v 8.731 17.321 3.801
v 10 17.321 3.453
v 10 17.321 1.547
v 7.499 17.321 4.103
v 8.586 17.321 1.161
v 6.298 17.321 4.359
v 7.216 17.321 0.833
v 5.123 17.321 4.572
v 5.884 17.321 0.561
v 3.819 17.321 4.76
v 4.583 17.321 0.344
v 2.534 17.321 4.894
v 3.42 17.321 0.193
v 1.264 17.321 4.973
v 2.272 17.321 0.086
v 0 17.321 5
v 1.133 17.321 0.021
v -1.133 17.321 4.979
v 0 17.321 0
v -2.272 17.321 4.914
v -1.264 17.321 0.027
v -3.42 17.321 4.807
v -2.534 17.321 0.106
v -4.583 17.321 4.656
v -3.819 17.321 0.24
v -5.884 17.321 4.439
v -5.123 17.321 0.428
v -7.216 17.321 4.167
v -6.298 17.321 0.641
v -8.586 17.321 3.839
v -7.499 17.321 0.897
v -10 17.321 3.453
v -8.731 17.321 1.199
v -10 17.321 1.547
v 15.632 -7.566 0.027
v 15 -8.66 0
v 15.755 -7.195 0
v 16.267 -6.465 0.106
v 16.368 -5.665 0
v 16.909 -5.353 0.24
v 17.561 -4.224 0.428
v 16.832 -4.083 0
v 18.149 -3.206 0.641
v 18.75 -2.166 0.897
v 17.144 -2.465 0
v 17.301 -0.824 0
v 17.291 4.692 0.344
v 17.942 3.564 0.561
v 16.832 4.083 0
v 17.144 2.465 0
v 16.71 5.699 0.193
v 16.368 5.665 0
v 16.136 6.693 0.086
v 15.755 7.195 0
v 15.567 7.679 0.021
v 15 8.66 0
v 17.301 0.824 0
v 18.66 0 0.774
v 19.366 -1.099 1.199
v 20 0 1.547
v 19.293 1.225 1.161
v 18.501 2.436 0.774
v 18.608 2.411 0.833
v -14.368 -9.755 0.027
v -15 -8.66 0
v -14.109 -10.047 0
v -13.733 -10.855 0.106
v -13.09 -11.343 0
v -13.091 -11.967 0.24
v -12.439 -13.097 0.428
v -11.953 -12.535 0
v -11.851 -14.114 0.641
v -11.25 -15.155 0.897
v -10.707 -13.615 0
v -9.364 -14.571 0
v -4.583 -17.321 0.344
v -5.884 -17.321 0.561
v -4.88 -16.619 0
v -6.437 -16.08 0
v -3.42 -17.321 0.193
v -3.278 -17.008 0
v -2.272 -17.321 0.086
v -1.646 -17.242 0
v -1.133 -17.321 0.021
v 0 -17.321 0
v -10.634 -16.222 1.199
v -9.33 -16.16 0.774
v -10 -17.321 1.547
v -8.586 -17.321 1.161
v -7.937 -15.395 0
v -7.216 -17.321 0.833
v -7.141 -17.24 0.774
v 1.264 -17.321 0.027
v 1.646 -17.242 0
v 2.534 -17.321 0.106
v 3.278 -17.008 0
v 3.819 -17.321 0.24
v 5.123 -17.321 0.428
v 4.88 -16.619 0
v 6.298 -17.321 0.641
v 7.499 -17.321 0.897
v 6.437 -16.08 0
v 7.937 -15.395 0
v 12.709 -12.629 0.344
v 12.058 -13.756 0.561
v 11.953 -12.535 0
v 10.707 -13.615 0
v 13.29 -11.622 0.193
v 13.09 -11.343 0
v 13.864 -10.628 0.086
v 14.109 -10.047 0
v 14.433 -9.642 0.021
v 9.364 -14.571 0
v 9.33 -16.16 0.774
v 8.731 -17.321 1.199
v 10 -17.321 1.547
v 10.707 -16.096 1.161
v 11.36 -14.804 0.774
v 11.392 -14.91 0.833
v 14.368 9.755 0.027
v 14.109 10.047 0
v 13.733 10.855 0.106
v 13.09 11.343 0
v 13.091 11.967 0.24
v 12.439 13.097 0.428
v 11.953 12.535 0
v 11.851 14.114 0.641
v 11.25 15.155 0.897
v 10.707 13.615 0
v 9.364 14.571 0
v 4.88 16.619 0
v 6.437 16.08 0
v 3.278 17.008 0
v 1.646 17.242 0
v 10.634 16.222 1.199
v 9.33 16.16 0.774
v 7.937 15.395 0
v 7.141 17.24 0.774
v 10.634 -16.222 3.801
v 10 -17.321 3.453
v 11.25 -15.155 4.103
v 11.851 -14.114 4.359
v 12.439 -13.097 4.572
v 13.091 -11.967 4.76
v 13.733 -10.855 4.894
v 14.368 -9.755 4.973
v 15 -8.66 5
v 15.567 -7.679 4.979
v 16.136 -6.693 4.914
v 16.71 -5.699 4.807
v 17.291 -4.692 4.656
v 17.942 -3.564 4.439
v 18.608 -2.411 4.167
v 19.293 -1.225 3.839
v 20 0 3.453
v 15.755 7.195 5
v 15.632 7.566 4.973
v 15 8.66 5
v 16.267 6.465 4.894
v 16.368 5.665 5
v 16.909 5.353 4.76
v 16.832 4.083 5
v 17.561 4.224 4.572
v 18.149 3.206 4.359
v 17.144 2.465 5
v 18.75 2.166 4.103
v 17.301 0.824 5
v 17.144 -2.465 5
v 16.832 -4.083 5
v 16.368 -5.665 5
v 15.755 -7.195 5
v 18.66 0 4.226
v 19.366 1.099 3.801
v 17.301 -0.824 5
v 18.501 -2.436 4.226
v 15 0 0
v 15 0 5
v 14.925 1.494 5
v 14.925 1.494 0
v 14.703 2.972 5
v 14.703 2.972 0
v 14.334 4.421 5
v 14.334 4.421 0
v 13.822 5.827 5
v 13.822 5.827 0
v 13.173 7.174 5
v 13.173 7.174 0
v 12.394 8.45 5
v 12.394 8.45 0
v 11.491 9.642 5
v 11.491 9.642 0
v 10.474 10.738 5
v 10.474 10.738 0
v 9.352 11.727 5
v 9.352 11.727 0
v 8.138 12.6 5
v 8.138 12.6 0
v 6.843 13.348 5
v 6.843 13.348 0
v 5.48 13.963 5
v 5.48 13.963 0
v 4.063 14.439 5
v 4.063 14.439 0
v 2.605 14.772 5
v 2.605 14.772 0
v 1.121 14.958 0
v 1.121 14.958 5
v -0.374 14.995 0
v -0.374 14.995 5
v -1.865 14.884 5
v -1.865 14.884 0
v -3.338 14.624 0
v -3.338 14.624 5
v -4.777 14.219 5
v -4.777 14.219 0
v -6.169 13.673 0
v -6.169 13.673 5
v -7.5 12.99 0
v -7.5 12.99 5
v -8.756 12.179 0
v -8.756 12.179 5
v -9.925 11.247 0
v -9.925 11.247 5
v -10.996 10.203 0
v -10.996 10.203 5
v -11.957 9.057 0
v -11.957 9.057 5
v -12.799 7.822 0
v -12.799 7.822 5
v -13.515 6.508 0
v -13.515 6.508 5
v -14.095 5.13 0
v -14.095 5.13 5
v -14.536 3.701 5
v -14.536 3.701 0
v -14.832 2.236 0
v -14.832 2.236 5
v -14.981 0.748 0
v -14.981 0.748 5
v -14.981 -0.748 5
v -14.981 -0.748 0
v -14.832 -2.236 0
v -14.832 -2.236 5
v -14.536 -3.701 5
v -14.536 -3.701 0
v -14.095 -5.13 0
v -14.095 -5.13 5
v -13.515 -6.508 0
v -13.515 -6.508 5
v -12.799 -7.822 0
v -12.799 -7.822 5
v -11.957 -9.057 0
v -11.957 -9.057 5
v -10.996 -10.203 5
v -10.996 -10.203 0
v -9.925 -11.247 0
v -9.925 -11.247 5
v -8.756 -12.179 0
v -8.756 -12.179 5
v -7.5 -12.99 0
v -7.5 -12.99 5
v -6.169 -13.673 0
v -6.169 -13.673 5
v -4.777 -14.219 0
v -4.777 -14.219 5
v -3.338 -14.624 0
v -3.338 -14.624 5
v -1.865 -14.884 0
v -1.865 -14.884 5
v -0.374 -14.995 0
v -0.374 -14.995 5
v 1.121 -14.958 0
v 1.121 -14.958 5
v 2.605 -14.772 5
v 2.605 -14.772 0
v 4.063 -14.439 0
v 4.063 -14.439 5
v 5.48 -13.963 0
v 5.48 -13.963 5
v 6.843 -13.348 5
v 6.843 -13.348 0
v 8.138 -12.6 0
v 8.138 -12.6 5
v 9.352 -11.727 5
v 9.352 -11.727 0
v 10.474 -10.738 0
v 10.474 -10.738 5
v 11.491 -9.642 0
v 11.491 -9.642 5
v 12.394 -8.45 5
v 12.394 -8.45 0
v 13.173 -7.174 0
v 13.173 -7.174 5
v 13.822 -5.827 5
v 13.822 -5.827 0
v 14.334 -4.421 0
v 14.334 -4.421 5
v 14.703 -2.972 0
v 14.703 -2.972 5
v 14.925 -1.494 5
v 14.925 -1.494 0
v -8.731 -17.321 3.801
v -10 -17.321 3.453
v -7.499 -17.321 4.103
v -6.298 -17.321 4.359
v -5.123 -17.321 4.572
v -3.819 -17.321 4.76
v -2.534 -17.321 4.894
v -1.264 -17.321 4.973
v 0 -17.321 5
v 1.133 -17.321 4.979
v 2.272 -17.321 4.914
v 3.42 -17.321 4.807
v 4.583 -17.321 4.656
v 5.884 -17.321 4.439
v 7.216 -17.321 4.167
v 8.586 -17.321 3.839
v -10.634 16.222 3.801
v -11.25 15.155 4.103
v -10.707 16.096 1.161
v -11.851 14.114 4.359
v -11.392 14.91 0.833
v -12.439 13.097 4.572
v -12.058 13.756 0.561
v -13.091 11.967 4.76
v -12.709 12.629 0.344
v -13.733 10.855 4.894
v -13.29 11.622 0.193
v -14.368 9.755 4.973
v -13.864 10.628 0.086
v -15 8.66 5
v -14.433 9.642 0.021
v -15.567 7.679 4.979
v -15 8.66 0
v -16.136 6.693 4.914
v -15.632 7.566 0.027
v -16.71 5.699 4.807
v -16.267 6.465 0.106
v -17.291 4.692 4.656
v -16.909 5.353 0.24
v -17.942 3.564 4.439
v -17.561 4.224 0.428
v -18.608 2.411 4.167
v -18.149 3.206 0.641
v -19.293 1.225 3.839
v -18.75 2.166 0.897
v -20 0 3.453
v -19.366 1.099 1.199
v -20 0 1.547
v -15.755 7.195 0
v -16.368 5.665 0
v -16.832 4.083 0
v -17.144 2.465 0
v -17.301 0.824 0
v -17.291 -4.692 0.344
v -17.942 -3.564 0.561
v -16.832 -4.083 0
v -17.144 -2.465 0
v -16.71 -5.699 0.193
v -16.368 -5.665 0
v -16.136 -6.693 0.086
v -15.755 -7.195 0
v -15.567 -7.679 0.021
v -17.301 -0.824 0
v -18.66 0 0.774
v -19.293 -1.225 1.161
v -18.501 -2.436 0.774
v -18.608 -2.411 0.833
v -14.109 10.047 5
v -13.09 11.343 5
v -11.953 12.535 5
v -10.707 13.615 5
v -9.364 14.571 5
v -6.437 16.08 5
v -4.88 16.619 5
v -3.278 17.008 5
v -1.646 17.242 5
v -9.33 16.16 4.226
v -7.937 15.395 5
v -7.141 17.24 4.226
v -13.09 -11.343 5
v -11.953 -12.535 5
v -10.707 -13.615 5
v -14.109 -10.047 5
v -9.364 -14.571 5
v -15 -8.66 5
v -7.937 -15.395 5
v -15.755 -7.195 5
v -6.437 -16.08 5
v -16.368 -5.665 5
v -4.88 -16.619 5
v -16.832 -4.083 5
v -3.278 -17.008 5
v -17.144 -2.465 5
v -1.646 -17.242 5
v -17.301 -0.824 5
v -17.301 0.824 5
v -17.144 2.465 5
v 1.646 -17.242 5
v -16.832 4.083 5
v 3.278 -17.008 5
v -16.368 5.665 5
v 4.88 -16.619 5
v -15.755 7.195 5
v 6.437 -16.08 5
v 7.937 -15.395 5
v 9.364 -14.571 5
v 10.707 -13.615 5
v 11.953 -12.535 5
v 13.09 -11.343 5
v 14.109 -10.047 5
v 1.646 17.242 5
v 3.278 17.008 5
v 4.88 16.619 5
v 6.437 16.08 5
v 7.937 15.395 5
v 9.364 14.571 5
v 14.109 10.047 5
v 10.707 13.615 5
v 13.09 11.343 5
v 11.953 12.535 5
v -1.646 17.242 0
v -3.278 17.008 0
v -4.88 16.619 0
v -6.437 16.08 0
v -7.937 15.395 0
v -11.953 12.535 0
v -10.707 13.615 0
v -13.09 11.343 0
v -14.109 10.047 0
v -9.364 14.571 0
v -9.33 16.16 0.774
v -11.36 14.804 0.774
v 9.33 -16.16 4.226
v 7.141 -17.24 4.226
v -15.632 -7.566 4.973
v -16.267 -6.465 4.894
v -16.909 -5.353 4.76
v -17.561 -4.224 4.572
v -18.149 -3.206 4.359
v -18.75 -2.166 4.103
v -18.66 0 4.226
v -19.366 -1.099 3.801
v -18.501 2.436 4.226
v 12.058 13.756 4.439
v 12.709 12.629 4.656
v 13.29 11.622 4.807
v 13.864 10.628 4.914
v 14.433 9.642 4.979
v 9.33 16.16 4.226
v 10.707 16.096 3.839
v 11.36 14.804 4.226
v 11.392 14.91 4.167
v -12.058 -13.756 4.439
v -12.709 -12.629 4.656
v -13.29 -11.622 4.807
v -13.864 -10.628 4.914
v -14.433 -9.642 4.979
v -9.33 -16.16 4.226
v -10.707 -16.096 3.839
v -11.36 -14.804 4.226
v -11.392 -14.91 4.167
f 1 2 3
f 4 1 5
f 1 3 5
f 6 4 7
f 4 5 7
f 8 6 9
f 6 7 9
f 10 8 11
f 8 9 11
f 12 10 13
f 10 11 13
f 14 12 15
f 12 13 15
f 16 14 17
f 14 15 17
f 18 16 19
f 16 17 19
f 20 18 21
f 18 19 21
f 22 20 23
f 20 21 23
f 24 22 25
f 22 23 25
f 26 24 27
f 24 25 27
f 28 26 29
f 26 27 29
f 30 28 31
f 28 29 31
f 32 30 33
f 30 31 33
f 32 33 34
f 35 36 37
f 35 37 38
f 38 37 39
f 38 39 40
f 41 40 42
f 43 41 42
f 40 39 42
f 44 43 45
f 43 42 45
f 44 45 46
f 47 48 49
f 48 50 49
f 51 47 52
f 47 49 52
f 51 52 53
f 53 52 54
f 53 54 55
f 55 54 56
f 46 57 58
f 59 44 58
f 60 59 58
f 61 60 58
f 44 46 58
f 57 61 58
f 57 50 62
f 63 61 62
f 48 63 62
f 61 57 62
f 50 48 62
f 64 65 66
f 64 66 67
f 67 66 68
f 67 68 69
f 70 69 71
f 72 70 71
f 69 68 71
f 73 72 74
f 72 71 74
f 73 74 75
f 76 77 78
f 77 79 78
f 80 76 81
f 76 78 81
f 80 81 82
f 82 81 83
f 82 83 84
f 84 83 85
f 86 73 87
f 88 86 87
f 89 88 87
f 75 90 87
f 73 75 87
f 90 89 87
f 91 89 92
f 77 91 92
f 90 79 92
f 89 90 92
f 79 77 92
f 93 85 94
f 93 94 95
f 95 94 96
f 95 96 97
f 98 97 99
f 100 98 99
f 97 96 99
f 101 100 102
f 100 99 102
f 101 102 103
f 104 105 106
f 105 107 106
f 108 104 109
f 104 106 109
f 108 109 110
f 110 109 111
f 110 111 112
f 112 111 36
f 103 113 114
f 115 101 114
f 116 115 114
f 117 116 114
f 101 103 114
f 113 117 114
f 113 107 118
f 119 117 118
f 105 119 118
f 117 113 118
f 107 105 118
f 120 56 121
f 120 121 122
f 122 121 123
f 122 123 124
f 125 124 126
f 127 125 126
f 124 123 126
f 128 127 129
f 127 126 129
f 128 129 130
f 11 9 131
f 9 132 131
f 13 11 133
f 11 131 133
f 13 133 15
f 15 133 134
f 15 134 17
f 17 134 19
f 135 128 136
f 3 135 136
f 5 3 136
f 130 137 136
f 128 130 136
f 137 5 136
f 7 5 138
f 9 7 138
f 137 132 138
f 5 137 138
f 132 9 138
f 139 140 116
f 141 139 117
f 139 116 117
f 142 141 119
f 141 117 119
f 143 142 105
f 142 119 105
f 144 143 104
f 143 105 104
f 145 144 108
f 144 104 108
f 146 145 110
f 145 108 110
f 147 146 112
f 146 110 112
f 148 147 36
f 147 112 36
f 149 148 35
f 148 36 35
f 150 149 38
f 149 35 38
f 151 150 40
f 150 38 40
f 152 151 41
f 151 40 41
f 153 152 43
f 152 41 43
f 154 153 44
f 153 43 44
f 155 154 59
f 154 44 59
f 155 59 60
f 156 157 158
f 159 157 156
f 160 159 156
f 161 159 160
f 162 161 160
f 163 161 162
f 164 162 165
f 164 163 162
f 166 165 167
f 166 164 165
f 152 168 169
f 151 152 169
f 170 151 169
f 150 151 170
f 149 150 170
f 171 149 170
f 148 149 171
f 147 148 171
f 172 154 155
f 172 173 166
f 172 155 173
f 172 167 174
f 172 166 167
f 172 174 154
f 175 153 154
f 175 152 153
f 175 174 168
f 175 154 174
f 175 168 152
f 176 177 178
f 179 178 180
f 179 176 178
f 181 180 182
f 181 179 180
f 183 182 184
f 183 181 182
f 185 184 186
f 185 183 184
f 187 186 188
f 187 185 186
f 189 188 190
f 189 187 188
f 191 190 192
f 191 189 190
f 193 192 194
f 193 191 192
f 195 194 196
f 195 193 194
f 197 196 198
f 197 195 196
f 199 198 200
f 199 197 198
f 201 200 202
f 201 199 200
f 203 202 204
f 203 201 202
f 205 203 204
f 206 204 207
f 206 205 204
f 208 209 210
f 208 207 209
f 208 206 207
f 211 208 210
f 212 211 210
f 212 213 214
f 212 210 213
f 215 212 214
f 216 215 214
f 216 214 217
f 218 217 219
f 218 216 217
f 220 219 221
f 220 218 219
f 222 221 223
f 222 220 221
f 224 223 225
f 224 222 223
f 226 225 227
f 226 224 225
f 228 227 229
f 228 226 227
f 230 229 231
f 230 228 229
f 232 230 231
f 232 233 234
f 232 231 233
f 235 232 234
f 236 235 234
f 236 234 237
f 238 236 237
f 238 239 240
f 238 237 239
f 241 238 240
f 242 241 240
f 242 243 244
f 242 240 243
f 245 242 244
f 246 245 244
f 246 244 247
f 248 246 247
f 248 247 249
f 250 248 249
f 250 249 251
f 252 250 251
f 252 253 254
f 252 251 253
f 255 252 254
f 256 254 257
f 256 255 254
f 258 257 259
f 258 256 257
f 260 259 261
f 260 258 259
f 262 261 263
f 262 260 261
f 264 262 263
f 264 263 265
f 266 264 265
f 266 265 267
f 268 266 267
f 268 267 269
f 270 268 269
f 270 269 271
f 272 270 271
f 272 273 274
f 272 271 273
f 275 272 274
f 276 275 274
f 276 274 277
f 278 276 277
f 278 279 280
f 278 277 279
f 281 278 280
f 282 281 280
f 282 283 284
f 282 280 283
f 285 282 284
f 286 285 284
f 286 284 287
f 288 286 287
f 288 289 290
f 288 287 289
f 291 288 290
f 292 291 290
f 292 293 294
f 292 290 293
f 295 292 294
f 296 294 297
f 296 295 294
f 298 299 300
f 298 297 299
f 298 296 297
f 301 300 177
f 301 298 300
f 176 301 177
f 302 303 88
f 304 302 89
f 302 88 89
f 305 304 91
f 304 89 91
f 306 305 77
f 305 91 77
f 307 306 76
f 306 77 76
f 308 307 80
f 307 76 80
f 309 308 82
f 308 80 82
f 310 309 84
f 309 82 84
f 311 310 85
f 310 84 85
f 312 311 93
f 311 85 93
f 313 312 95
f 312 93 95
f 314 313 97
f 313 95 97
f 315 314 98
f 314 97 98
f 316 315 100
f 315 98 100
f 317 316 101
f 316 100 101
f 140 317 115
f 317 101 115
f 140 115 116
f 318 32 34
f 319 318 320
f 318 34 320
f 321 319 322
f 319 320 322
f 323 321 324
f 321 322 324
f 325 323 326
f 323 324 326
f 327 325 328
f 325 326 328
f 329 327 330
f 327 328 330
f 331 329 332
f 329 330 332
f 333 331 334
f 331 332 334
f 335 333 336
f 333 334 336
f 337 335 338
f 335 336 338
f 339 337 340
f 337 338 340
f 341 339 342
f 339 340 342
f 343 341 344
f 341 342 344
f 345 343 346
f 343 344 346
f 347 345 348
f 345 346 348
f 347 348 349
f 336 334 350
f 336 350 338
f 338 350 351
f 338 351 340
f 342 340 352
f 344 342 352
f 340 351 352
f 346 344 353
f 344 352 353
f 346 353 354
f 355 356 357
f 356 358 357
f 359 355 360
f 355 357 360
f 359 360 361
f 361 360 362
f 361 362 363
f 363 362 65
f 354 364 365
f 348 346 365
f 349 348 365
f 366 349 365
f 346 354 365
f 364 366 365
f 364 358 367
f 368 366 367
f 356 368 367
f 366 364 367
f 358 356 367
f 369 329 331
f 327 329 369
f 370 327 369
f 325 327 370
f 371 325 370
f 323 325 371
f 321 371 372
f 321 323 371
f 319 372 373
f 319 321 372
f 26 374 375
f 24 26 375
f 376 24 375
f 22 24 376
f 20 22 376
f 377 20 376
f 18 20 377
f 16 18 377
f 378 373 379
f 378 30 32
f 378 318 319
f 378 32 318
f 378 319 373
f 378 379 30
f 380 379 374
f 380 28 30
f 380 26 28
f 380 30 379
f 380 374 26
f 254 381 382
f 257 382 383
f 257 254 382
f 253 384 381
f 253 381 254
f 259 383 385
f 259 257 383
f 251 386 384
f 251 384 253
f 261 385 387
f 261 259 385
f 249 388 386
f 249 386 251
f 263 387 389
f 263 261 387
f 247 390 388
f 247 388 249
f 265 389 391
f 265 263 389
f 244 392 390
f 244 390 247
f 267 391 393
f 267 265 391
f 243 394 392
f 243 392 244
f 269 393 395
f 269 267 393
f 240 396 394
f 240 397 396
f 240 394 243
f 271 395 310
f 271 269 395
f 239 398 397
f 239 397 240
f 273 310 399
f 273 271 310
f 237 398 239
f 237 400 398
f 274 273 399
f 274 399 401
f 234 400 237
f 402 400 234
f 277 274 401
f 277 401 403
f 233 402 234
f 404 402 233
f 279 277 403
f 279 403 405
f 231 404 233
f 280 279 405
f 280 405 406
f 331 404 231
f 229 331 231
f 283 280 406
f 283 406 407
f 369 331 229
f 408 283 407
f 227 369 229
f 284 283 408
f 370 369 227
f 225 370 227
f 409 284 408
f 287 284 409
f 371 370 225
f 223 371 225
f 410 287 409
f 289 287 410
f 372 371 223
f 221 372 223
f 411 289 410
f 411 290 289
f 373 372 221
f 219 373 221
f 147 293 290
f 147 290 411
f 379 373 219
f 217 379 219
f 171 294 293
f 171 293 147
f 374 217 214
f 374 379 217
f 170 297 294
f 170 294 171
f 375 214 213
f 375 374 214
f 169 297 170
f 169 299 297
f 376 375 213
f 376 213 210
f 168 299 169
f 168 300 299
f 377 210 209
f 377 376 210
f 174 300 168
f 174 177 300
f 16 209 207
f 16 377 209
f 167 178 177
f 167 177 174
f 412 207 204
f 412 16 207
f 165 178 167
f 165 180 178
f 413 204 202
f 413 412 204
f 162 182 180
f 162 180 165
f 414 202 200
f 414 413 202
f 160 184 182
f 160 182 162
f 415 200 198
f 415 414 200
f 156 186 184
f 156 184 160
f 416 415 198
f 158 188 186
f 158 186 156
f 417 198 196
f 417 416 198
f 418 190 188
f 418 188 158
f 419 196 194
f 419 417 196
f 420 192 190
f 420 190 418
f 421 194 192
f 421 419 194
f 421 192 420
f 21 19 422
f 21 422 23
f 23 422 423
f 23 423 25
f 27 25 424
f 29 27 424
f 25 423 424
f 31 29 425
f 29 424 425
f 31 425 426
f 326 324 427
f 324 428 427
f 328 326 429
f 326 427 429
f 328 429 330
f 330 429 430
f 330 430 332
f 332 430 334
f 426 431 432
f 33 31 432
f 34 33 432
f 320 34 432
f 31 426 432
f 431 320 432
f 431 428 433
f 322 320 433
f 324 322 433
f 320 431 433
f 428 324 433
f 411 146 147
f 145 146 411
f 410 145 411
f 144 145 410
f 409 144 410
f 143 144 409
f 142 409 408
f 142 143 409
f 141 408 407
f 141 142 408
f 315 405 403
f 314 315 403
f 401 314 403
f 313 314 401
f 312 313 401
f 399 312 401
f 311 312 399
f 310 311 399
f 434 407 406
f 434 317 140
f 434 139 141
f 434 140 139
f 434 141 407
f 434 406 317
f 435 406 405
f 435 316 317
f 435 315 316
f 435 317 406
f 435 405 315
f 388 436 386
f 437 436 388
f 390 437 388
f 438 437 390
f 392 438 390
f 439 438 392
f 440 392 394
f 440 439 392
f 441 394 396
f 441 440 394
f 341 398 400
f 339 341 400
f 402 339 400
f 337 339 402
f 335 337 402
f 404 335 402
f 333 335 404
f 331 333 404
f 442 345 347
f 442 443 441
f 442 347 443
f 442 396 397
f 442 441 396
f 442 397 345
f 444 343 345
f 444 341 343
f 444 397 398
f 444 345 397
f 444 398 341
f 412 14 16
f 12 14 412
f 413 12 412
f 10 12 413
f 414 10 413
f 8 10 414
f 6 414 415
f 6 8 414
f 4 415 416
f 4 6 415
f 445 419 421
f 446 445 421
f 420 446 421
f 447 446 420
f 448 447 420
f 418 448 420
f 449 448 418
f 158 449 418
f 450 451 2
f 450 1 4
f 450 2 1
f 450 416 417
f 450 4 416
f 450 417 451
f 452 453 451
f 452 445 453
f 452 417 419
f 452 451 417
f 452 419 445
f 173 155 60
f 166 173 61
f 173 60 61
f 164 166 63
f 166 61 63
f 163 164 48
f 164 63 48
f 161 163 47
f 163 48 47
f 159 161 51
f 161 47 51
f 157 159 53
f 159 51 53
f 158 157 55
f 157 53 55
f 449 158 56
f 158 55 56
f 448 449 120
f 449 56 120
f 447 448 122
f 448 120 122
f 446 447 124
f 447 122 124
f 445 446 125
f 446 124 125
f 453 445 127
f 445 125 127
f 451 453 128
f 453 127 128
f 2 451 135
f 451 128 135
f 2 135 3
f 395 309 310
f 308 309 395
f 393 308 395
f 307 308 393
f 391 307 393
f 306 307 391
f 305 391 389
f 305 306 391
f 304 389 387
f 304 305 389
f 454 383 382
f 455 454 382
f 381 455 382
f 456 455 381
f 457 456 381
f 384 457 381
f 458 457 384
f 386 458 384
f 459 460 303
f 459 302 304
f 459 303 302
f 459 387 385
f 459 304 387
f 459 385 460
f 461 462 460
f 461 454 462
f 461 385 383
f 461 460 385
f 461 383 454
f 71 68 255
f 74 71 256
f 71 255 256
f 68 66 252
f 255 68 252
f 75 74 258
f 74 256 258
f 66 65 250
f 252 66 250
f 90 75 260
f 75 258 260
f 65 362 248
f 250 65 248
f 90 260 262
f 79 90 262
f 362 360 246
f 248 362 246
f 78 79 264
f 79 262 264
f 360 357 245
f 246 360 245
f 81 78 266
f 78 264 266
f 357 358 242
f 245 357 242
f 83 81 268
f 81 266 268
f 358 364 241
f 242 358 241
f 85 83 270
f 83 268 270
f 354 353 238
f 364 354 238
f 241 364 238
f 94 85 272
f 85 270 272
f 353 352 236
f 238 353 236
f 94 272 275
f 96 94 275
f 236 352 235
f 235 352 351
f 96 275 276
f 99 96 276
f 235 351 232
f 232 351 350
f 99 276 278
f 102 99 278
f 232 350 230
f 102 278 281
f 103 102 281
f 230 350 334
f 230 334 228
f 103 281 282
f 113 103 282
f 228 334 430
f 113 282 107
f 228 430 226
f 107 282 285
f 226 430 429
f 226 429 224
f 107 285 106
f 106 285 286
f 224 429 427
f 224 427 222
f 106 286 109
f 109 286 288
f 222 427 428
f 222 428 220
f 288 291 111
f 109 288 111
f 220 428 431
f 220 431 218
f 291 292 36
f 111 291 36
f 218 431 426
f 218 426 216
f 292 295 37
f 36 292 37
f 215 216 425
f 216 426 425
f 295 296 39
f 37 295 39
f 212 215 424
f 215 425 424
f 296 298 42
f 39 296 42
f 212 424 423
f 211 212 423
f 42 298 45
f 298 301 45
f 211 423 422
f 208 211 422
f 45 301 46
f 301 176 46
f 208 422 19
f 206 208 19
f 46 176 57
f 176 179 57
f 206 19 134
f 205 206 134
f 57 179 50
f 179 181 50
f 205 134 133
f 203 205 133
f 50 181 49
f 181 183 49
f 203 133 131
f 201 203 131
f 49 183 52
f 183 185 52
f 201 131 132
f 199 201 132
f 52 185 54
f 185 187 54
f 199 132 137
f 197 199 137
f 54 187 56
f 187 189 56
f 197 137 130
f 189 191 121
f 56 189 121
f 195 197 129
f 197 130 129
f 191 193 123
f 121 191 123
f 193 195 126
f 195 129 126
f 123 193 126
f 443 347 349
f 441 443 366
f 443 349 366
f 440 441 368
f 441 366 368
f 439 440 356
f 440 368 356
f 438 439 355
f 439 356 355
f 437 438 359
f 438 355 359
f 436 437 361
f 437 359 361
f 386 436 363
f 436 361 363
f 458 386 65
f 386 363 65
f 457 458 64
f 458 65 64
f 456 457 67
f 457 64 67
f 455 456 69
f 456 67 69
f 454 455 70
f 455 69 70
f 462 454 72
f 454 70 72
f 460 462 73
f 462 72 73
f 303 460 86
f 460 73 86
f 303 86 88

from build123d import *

# Parameters (mm, degrees)
DODANIE_WYCI_GNI_CIE1_DEPTH = 5
SZKIC2_OUTSIDE_W            = 139.232
SZKIC2_OUTSIDE_H            = 133.874
SZKIC2_OUTSIDE_R            = 17.320508076
WYTNIJ_WYCI_GNI_CIE1_DEPTH  = 25
WYTNIJ_WYCI_GNI_CIE1_DRAFT  = 60
SZKIC3_R                    = 15
WYTNIJ_WYCI_GNI_CIE5_DEPTH  = 15
SZKIC5_OUTSIDE_W            = 87.272
SZKIC5_OUTSIDE_H            = 81.914
SZKIC5_OUTSIDE_R            = 17.320508076
WYTNIJ_WYCI_GNI_CIE8_DEPTH  = 10
WYTNIJ_WYCI_GNI_CIE8_TAPER  = 60


with BuildPart() as part:
    # Szkic1 → Dodanie-wyciągnięcie1 (new body)
    with BuildSketch(Plane.XY):
        Polygon((10, 17.320508076), (-10, 17.320508076), (-20, 0), (-10, -17.320508076), (10, -17.320508076), (20, 0), align=None)
    extrude(amount=DODANIE_WYCI_GNI_CIE1_DEPTH)


with BuildPart() as wytnij_wyci_gni_cie1_tool:
    # Szkic2 outside → Wytnij-wyciągnięcie1 (with draft: the straight prism first)
    with BuildSketch(Plane.XY):
        Rectangle(SZKIC2_OUTSIDE_W, SZKIC2_OUTSIDE_H)
        Circle(SZKIC2_OUTSIDE_R, mode=Mode.SUBTRACT)
    extrude(amount=WYTNIJ_WYCI_GNI_CIE1_DEPTH)
    # Wytnij-wyciągnięcie1: the draft: its side faces are tilted about the plane it starts from
    wytnij_wyci_gni_cie1_sides = [wytnij_wyci_gni_cie1_tool.faces().sort_by_distance(p)[0] for p in [
        (0, -66.937, 12.5),
        (69.616, 0, 12.5),
        (0, 66.937, 12.5),
        (-69.616, 0, 12.5),
        (-17.320508076, 0, 12.5),
    ]]
    draft(wytnij_wyci_gni_cie1_sides, Plane.XY, WYTNIJ_WYCI_GNI_CIE1_DRAFT)


with BuildPart() as part_1:
    add(part.part)

    # Wytnij-wyciągnięcie1: cut by wytnij_wyci_gni_cie1_tool
    add(wytnij_wyci_gni_cie1_tool.part, mode=Mode.SUBTRACT)

    # Szkic3 → Wytnij-wyciągnięcie5 (cut)
    with BuildSketch(Plane.XY):
        Circle(SZKIC3_R)
    extrude(amount=WYTNIJ_WYCI_GNI_CIE5_DEPTH, mode=Mode.SUBTRACT)

    # Szkic5 outside → Wytnij-wyciągnięcie8 (cut)
    with BuildSketch(Plane.XY.offset(5)):
        Rectangle(SZKIC5_OUTSIDE_W, SZKIC5_OUTSIDE_H)
        Circle(SZKIC5_OUTSIDE_R, mode=Mode.SUBTRACT)
    extrude(amount=-WYTNIJ_WYCI_GNI_CIE8_DEPTH, taper=WYTNIJ_WYCI_GNI_CIE8_TAPER, mode=Mode.SUBTRACT)


solid = part_1.part
